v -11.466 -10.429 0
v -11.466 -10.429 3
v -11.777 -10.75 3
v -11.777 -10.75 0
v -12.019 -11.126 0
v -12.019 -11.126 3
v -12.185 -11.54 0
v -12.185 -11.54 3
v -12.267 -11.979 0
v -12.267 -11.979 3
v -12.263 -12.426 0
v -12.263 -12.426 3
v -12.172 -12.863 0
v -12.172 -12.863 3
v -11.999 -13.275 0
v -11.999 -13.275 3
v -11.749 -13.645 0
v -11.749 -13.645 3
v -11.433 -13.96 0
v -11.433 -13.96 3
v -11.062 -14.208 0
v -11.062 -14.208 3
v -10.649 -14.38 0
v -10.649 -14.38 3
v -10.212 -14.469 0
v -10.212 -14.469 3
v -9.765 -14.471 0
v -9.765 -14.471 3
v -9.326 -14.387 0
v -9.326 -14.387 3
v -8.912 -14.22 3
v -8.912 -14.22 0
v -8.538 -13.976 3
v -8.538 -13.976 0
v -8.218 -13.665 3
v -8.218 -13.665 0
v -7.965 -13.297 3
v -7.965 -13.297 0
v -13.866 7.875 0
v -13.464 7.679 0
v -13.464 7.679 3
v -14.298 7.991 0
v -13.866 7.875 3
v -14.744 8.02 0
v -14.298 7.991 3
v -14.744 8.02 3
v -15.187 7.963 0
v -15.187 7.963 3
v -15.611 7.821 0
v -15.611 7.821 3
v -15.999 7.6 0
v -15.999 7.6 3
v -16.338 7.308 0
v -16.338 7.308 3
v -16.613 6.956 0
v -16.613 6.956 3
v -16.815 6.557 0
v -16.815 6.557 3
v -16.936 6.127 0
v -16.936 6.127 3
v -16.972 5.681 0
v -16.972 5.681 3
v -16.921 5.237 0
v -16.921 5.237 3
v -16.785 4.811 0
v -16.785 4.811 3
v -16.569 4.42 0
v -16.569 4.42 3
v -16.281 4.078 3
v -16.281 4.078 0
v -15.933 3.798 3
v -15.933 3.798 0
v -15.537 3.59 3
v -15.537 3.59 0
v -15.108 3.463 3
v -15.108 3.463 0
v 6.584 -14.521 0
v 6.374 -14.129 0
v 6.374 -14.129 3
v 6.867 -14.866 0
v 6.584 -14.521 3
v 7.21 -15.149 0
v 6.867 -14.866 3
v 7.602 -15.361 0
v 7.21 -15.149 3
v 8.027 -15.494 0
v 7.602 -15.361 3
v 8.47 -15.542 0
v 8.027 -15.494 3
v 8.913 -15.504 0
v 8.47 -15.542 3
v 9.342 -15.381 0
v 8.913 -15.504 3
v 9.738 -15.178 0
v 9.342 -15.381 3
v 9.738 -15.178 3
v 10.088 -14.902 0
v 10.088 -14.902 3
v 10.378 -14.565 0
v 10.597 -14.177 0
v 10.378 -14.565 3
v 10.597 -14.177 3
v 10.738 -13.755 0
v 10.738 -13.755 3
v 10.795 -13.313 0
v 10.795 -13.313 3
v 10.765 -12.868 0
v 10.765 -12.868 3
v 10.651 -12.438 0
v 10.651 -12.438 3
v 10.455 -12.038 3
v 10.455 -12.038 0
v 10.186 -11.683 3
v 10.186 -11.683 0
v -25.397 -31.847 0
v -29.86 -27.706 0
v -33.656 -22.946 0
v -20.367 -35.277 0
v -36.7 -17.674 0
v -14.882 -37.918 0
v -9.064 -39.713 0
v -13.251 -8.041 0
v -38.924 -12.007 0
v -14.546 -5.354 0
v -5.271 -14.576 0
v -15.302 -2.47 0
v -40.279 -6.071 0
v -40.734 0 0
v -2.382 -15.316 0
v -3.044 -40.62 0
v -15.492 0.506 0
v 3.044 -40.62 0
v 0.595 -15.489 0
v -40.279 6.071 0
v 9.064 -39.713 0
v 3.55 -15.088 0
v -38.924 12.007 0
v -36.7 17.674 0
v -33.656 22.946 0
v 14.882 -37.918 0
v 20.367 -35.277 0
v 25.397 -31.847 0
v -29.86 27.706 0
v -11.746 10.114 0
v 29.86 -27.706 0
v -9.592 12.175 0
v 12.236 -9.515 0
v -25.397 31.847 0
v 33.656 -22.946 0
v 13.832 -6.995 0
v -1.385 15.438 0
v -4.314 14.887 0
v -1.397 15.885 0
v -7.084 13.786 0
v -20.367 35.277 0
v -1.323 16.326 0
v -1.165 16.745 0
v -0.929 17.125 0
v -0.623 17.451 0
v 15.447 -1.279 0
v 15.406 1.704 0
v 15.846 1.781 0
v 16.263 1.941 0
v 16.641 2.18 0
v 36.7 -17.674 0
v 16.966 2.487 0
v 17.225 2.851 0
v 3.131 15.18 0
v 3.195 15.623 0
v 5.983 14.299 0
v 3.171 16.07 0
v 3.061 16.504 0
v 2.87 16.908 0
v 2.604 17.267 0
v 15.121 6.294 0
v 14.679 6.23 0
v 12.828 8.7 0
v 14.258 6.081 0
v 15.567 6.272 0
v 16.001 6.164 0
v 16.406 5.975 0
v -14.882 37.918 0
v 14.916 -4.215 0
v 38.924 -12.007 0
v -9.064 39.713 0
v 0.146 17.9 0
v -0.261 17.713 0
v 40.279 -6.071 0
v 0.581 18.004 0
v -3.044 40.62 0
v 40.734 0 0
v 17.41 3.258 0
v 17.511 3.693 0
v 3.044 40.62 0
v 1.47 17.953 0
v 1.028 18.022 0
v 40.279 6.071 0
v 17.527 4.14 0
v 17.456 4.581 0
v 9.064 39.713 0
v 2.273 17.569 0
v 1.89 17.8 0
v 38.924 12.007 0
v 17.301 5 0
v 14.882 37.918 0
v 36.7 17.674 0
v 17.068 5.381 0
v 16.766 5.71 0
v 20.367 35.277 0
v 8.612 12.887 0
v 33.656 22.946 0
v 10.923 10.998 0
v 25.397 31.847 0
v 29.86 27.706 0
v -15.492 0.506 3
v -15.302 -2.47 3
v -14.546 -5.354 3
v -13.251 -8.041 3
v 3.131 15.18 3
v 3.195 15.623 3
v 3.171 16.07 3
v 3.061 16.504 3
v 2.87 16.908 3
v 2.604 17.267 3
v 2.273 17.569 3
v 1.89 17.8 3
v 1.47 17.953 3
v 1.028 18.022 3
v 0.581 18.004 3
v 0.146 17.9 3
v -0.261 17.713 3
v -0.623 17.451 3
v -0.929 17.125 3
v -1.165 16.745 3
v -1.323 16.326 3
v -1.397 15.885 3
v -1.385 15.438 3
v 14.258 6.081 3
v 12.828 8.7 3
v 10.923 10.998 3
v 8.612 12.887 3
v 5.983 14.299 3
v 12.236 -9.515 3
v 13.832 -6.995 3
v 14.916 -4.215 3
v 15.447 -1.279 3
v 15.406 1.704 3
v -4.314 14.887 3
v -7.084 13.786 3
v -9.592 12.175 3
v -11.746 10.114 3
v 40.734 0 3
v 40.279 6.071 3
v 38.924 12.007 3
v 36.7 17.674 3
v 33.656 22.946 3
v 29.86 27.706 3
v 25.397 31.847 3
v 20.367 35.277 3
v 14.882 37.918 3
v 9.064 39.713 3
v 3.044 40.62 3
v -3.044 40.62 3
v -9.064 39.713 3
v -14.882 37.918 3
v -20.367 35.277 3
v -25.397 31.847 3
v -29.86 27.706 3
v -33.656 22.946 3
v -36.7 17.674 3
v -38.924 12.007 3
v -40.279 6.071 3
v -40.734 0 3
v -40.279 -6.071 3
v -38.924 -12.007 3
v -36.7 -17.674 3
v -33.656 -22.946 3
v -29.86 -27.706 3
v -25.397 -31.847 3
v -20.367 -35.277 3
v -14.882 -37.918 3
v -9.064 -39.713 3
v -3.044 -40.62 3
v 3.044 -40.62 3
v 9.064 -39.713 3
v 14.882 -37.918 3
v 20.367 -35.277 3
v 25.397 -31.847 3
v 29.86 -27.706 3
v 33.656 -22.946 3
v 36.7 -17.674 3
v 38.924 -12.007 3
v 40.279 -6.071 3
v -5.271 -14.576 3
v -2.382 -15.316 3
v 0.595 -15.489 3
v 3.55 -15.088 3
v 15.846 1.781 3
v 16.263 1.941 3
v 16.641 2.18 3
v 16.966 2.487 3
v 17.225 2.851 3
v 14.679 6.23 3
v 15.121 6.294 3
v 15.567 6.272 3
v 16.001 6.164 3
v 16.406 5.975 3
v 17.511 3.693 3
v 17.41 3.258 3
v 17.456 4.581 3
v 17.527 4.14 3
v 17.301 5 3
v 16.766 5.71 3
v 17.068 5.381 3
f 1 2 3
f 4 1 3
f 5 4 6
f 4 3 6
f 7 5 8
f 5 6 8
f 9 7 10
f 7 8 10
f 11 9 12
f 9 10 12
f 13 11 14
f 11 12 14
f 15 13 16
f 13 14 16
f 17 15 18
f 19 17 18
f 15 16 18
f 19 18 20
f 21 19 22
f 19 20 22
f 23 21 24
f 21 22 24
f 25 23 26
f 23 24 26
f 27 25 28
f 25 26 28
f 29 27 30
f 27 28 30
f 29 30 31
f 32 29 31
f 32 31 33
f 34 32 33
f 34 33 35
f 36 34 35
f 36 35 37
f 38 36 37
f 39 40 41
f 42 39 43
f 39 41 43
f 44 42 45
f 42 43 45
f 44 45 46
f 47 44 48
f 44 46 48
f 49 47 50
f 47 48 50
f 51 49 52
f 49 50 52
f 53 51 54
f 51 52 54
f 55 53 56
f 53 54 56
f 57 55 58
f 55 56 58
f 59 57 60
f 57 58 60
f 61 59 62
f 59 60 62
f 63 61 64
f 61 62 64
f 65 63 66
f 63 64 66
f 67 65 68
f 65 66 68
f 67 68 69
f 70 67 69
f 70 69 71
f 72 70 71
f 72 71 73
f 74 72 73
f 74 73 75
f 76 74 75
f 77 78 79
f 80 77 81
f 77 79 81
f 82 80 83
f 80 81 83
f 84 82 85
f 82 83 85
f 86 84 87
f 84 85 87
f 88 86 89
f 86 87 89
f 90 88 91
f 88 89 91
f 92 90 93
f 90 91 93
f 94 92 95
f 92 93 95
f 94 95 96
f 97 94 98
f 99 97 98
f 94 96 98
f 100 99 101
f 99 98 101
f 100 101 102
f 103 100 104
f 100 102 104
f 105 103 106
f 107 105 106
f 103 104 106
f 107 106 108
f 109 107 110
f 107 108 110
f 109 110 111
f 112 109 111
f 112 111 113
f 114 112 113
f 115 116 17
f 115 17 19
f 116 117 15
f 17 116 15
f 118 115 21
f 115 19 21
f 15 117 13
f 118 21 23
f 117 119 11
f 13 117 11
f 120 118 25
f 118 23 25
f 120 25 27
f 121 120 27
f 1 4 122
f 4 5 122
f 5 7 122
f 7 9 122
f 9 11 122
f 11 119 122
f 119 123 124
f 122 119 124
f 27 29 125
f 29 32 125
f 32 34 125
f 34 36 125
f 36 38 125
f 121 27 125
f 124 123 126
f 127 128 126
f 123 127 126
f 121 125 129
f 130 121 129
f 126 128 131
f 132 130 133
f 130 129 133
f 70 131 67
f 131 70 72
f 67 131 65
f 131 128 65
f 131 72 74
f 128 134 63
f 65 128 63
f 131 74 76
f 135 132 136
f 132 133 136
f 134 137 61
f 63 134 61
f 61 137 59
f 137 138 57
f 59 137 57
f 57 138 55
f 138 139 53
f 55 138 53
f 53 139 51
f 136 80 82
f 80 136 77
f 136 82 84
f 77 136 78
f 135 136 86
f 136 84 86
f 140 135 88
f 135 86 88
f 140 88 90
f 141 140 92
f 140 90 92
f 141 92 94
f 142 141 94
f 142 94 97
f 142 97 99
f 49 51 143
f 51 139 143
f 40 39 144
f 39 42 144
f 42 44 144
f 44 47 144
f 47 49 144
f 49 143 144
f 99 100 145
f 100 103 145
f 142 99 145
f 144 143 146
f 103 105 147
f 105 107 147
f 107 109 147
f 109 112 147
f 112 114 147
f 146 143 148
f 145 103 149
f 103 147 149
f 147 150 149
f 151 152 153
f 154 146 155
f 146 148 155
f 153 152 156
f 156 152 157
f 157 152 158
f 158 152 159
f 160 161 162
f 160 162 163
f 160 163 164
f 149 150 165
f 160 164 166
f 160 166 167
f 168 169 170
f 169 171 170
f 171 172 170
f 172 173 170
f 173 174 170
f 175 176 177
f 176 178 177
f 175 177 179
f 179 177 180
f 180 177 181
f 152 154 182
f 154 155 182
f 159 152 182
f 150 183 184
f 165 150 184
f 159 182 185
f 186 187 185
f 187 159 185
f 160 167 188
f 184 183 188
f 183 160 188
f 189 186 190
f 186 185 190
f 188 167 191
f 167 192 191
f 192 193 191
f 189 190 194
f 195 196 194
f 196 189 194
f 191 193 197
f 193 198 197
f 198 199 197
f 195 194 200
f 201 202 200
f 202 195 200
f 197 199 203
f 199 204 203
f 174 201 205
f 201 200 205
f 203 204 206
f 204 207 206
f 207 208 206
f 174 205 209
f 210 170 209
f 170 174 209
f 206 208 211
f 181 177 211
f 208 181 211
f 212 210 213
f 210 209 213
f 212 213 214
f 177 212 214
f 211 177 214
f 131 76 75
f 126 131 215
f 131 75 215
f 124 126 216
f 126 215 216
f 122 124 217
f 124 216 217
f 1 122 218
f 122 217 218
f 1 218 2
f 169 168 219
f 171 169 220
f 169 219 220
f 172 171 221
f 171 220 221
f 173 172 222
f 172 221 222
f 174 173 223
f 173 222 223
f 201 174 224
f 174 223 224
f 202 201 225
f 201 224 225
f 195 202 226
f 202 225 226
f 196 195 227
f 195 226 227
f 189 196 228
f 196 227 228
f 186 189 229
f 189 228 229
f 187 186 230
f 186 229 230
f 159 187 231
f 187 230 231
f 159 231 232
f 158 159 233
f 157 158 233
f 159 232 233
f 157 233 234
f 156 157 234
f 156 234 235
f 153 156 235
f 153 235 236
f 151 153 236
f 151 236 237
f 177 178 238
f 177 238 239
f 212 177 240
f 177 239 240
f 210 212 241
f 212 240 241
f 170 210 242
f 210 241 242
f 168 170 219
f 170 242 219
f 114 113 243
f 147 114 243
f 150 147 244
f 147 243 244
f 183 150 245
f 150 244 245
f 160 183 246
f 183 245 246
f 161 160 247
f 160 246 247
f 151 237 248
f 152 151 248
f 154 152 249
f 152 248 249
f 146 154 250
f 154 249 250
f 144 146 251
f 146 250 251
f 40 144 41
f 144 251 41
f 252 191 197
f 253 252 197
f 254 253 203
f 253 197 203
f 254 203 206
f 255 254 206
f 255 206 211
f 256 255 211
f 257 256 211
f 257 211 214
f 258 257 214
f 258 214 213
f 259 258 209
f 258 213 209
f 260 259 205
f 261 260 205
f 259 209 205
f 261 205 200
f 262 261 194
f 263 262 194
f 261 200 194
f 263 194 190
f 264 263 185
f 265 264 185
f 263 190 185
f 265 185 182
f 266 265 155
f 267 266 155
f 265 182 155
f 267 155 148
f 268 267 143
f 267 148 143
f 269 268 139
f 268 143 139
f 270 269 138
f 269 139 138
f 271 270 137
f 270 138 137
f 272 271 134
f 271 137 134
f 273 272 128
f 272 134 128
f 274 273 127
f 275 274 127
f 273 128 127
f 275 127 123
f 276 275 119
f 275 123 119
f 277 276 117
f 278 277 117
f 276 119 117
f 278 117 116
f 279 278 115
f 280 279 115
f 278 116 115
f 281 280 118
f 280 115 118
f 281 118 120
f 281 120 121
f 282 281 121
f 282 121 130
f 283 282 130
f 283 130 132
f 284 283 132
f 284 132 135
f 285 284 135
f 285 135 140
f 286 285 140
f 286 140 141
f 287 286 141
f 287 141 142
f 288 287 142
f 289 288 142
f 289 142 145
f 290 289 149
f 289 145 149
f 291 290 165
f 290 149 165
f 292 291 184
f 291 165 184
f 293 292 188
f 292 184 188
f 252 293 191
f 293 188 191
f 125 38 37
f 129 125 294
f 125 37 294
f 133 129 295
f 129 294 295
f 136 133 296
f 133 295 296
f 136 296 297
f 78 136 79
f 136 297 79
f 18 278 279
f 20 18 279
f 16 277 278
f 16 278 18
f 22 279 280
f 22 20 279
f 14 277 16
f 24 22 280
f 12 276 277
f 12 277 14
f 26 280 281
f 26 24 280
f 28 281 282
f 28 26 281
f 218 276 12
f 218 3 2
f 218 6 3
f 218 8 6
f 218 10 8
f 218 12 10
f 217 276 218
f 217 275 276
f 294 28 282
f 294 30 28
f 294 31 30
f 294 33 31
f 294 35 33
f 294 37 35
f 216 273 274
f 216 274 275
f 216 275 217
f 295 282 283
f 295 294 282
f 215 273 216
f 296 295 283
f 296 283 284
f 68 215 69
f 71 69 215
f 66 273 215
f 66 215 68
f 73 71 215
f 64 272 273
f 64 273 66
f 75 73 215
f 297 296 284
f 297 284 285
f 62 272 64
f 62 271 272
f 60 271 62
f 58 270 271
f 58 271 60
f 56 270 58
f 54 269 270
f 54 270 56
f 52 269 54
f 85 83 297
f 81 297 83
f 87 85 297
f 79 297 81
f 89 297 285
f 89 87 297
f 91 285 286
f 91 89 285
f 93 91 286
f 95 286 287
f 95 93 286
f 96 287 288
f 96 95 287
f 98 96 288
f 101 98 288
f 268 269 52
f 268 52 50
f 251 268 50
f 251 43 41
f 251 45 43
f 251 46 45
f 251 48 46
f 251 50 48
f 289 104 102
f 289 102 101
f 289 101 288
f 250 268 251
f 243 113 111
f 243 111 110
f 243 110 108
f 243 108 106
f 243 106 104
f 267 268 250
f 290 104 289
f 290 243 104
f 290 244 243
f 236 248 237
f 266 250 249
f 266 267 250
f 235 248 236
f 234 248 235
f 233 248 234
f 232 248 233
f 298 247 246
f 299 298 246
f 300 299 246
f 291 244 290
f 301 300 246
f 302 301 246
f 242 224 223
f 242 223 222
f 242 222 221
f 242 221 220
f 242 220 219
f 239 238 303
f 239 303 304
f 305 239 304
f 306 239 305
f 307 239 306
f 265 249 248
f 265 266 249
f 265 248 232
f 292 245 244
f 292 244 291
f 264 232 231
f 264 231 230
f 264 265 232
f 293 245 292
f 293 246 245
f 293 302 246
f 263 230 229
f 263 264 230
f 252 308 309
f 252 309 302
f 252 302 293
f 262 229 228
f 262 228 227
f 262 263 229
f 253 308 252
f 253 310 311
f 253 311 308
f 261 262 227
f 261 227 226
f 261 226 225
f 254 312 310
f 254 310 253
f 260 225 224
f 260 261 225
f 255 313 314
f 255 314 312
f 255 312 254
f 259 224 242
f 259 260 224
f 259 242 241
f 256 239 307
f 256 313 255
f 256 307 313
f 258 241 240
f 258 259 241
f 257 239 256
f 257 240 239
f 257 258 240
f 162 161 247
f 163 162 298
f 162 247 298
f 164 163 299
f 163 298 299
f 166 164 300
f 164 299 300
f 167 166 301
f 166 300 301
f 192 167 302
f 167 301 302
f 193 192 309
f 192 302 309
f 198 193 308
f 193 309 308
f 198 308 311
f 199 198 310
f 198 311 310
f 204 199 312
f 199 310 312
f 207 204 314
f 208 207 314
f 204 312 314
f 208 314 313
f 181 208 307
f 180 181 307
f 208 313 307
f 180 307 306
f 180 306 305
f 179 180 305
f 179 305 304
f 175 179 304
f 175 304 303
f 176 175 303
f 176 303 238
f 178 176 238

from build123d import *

# Parameters (mm, degrees)
F0_R     = 40.7341209129
F1_DEPTH = 3
F2_R     = 12.35
F3_DEPTH = 5
F4_R     = 15.5
F5_DEPTH = 3
F7_R     = 2.3
F8_DEPTH = 25


# Not quite as in the source:
# - a feature names something its author has since deleted; it is built from what else it names


with BuildPart() as f1:
    # F0 (on Top) → F1 (new body)
    with BuildSketch(Plane.XY):
        Circle(F0_R)
    extrude(amount=F1_DEPTH)

    # F2 (on face) → F3 (cut)
    with BuildSketch(Plane.XY.offset(3)):
        Circle(F2_R)
    extrude(amount=-F3_DEPTH, mode=Mode.SUBTRACT)

    # F4 (on face) → F5 (cut)
    with BuildSketch(Plane.XY.offset(3)):
        Circle(F4_R)
    extrude(amount=-F5_DEPTH, mode=Mode.SUBTRACT)

    # F7 (on face) → F8 (cut)
    with BuildSketch(Plane.XY.offset(3)):
        with Locations((15.2315180749, 3.9969421923)):
            Circle(F7_R)
        with Locations((8.4959734231, -13.2423266768)):
            Circle(F7_R)
        with Locations((-9.9757602438, -12.1809709817)):
            Circle(F7_R)
        with Locations((-14.6723501384, 5.7214666158)):
            Circle(F7_R)
        with Locations((0.8970320341, 15.7257020473)):
            Circle(F7_R)
    extrude(amount=-F8_DEPTH, mode=Mode.SUBTRACT)


solid = f1.part
